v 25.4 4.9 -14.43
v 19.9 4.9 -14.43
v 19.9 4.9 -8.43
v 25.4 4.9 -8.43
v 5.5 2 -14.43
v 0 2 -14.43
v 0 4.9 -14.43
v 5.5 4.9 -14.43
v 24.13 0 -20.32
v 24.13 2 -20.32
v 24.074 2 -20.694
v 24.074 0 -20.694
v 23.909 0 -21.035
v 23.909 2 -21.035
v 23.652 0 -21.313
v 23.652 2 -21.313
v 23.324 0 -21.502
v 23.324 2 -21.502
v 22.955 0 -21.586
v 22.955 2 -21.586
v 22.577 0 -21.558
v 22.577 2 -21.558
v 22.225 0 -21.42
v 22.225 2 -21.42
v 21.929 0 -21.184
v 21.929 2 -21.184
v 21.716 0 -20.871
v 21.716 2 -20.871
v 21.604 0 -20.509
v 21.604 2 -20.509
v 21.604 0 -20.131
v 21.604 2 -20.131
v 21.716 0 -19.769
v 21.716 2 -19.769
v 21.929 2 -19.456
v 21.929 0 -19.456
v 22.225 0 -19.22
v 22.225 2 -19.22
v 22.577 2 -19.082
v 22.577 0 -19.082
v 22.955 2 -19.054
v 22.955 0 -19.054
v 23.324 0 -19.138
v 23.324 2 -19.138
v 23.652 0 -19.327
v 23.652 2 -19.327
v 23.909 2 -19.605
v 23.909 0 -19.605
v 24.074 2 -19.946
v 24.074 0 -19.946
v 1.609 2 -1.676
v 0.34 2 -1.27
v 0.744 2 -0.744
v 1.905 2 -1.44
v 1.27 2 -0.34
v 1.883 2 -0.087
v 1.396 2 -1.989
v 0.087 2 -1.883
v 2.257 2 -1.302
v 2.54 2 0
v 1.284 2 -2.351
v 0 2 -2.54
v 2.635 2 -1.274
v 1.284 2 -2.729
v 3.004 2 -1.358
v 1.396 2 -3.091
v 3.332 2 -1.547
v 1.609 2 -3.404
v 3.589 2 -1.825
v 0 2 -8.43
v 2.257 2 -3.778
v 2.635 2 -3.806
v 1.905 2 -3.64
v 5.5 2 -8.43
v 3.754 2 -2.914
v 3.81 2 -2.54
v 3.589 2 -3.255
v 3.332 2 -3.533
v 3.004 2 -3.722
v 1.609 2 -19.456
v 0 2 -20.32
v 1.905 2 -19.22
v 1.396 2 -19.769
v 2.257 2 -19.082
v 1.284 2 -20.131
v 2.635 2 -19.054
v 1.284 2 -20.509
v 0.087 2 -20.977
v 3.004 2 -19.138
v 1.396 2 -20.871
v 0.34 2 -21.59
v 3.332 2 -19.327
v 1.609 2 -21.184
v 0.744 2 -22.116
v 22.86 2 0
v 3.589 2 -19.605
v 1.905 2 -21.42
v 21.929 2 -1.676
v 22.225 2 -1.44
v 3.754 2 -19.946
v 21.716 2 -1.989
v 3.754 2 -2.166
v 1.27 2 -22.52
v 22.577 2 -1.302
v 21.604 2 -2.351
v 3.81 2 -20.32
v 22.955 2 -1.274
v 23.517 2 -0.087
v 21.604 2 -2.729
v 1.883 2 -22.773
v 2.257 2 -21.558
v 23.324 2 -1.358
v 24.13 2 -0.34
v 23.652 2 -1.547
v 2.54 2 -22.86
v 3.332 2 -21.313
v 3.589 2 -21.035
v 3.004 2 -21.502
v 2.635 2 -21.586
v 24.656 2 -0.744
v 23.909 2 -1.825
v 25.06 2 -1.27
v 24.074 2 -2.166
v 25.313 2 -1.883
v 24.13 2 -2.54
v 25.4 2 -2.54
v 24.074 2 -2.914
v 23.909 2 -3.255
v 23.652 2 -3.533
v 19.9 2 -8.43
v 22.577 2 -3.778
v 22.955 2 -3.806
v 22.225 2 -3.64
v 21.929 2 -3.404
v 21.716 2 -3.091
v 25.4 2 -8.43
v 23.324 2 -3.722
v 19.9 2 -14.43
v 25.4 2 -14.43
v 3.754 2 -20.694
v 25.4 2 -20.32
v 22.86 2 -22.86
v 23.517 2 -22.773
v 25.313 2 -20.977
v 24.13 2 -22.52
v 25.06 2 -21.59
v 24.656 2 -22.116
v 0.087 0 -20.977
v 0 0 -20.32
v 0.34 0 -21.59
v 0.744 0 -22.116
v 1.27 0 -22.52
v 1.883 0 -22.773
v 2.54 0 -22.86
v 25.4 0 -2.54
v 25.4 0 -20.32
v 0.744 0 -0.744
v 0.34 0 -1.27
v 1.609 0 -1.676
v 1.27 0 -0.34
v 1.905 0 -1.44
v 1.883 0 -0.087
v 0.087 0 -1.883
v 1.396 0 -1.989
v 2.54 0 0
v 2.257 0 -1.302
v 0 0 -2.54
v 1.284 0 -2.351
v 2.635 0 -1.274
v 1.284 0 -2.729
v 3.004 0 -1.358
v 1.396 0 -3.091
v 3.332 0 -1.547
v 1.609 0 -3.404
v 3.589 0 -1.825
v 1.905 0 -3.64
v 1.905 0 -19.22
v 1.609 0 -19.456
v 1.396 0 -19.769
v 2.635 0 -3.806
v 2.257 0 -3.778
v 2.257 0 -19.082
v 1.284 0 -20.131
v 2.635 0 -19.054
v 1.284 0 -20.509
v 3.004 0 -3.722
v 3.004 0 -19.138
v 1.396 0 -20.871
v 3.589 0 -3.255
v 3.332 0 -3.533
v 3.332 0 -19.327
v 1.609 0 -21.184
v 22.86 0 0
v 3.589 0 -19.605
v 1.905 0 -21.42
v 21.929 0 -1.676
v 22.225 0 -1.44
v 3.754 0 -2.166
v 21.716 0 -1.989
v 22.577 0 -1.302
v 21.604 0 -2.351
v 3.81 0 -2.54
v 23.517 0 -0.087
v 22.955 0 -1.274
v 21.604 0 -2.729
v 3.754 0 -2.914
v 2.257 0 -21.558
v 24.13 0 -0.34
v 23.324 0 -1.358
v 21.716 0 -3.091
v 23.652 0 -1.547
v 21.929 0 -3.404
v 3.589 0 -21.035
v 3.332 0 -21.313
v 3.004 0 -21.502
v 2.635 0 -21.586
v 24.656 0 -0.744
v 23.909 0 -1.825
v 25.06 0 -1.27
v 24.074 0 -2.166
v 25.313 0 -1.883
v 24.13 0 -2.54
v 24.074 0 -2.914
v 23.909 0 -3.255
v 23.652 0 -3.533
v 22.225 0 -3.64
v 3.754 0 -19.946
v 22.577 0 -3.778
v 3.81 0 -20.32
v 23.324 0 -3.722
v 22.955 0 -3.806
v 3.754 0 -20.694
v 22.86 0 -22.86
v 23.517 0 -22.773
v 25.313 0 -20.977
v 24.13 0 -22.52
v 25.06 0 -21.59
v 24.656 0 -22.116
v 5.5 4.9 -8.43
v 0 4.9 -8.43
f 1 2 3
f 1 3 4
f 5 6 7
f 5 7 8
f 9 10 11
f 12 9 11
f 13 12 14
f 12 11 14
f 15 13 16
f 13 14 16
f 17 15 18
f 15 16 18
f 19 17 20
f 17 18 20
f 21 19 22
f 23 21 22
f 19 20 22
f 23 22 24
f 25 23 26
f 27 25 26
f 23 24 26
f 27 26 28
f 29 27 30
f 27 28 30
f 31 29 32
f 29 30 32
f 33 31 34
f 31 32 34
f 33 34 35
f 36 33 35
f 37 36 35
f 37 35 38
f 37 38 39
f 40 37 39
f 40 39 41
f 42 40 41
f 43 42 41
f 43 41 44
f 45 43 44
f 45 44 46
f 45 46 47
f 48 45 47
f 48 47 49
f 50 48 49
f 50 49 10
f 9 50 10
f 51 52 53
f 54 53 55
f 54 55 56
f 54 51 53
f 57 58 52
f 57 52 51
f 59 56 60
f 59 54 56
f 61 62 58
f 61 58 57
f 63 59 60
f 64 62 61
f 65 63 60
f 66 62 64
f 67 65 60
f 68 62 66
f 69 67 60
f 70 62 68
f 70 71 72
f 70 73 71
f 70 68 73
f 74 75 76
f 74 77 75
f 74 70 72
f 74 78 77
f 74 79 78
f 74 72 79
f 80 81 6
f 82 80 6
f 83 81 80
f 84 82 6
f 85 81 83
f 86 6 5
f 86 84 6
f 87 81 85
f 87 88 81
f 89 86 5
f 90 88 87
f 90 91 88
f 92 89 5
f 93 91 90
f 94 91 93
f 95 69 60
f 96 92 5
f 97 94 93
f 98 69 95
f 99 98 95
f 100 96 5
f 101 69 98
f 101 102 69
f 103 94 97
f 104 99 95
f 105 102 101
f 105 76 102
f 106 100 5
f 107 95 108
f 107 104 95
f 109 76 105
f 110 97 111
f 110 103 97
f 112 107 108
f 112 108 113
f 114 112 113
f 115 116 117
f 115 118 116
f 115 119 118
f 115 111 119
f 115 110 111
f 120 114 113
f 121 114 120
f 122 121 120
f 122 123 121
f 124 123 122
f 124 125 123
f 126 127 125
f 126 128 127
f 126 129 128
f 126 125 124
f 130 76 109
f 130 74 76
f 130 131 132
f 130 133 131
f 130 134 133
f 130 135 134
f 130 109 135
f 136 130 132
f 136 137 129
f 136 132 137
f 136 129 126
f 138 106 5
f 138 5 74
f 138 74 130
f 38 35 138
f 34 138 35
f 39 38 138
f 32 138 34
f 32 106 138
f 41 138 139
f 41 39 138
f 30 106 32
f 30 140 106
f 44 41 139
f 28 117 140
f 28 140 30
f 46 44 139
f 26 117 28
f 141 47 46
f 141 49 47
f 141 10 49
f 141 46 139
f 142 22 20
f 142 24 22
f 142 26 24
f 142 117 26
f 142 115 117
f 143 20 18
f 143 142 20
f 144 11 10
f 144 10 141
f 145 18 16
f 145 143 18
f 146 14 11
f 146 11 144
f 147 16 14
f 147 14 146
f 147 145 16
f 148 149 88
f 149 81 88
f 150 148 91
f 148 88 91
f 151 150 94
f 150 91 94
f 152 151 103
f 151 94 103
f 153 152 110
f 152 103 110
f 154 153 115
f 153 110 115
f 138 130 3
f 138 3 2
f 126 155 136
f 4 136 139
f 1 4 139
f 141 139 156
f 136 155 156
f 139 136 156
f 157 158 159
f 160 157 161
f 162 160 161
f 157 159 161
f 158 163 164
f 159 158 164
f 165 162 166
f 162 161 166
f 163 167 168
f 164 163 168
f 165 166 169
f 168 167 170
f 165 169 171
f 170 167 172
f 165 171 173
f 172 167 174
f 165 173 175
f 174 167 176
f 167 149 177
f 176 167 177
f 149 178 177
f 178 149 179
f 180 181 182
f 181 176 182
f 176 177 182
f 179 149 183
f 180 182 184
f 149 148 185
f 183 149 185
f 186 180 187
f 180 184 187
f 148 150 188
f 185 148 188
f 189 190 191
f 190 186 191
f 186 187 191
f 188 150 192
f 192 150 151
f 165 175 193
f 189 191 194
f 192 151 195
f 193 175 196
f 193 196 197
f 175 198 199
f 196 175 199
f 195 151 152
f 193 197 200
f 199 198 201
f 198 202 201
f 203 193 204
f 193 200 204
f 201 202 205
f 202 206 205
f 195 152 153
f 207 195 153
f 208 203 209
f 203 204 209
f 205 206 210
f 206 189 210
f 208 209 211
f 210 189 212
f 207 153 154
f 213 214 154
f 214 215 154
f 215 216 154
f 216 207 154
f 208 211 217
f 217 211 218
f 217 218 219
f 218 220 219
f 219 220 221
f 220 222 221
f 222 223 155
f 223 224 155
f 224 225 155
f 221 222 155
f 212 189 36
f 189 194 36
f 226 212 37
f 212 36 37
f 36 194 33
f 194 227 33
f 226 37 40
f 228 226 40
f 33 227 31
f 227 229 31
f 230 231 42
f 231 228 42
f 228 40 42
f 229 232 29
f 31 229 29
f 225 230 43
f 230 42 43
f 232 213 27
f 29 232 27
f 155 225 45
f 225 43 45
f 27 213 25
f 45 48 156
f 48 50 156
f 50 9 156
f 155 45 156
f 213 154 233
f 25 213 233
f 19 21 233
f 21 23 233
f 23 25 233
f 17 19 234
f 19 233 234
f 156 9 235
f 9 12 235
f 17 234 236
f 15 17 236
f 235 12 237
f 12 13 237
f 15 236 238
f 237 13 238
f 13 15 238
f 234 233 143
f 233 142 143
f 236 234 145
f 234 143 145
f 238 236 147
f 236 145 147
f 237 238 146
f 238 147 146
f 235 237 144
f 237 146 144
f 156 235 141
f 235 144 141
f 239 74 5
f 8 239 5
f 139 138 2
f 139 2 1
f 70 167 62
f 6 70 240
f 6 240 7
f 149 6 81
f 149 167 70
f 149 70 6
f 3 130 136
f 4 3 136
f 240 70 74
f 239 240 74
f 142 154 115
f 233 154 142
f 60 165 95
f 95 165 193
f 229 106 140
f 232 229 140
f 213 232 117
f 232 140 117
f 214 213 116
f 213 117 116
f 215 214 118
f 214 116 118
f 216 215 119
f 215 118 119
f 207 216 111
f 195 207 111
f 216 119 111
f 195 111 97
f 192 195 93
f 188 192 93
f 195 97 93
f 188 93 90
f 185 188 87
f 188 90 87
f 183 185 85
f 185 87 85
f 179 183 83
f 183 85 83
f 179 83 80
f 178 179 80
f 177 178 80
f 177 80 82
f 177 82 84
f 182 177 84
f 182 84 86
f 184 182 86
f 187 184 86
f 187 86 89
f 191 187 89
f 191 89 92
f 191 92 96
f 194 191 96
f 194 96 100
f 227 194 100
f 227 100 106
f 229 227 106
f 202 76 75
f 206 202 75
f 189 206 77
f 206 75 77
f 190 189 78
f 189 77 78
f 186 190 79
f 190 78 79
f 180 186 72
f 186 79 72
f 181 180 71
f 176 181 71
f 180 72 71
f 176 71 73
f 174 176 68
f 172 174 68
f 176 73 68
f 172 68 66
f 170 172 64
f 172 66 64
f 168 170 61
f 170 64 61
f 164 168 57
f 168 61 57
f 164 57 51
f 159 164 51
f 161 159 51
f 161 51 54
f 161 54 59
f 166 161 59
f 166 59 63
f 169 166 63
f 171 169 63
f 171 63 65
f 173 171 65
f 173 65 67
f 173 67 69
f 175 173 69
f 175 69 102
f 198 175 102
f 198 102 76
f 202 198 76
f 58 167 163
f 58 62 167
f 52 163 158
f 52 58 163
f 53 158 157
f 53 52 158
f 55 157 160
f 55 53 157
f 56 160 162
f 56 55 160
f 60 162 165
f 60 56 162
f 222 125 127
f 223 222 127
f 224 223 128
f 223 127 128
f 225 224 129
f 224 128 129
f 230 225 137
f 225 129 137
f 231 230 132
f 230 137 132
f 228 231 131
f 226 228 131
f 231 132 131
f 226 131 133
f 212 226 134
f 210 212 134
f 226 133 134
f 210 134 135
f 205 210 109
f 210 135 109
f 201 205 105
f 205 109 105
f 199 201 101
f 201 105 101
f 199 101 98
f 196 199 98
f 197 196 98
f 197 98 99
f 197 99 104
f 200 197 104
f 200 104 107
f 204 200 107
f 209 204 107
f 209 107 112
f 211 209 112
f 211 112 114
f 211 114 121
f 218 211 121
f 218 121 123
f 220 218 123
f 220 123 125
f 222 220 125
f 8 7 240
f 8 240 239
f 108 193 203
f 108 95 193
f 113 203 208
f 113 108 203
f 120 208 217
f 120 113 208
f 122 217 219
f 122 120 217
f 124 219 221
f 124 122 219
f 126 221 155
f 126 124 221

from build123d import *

# Parameters (mm, degrees)
SKETCH2_W           = 25.4
SKETCH2_H           = 22.86
BOSS_EXTRUDE1_DEPTH = 2
SKETCH5_R           = 1.27
CUT_EXTRUDE1_DEPTH  = 3
FILLET1_R           = 2.54
SKETCH6_W           = 5.5
SKETCH6_H           = 6
BOSS_EXTRUDE2_DEPTH = 2.9


with BuildPart() as part:
    # Sketch2 → Boss-Extrude1 (new body)
    with BuildSketch(Plane(origin=(0, 0, 0), x_dir=(1, 0, 0), z_dir=(0, 1, 0))):
        with Locations((12.7, 11.43)):
            Rectangle(SKETCH2_W, SKETCH2_H)
    extrude(amount=BOSS_EXTRUDE1_DEPTH)

    # Sketch5 → Cut-Extrude1 (cut, through all)
    with BuildSketch(Plane(origin=(0, 2, 0), x_dir=(1, 0, 0), z_dir=(0, 1, 0))):
        with Locations((2.54, 2.54)):
            Circle(SKETCH5_R)
        with Locations((22.86, 2.54)):
            Circle(SKETCH5_R)
        with Locations((22.86, 20.32)):
            Circle(SKETCH5_R)
        with Locations((2.54, 20.32)):
            Circle(SKETCH5_R)
    extrude(amount=-CUT_EXTRUDE1_DEPTH, mode=Mode.SUBTRACT)

    # Fillet1
    fillet1_edges = [part.edges().sort_by_distance(p)[0] for p in [
        (0, 1, -22.86),
        (25.4, 1, -22.86),
        (25.4, 1, 0),
        (0, 1, 0),
    ]]
    fillet(fillet1_edges, radius=FILLET1_R)

    # Sketch6 → Boss-Extrude2 (add)
    with BuildSketch(Plane(origin=(0, 2, 0), x_dir=(1, 0, 0), z_dir=(0, 1, 0))):
        with Locations((2.75, 11.43)):
            Rectangle(SKETCH6_W, SKETCH6_H)
        with Locations((22.65, 11.43)):
            Rectangle(SKETCH6_W, SKETCH6_H)
    extrude(amount=BOSS_EXTRUDE2_DEPTH)


solid = part.part
